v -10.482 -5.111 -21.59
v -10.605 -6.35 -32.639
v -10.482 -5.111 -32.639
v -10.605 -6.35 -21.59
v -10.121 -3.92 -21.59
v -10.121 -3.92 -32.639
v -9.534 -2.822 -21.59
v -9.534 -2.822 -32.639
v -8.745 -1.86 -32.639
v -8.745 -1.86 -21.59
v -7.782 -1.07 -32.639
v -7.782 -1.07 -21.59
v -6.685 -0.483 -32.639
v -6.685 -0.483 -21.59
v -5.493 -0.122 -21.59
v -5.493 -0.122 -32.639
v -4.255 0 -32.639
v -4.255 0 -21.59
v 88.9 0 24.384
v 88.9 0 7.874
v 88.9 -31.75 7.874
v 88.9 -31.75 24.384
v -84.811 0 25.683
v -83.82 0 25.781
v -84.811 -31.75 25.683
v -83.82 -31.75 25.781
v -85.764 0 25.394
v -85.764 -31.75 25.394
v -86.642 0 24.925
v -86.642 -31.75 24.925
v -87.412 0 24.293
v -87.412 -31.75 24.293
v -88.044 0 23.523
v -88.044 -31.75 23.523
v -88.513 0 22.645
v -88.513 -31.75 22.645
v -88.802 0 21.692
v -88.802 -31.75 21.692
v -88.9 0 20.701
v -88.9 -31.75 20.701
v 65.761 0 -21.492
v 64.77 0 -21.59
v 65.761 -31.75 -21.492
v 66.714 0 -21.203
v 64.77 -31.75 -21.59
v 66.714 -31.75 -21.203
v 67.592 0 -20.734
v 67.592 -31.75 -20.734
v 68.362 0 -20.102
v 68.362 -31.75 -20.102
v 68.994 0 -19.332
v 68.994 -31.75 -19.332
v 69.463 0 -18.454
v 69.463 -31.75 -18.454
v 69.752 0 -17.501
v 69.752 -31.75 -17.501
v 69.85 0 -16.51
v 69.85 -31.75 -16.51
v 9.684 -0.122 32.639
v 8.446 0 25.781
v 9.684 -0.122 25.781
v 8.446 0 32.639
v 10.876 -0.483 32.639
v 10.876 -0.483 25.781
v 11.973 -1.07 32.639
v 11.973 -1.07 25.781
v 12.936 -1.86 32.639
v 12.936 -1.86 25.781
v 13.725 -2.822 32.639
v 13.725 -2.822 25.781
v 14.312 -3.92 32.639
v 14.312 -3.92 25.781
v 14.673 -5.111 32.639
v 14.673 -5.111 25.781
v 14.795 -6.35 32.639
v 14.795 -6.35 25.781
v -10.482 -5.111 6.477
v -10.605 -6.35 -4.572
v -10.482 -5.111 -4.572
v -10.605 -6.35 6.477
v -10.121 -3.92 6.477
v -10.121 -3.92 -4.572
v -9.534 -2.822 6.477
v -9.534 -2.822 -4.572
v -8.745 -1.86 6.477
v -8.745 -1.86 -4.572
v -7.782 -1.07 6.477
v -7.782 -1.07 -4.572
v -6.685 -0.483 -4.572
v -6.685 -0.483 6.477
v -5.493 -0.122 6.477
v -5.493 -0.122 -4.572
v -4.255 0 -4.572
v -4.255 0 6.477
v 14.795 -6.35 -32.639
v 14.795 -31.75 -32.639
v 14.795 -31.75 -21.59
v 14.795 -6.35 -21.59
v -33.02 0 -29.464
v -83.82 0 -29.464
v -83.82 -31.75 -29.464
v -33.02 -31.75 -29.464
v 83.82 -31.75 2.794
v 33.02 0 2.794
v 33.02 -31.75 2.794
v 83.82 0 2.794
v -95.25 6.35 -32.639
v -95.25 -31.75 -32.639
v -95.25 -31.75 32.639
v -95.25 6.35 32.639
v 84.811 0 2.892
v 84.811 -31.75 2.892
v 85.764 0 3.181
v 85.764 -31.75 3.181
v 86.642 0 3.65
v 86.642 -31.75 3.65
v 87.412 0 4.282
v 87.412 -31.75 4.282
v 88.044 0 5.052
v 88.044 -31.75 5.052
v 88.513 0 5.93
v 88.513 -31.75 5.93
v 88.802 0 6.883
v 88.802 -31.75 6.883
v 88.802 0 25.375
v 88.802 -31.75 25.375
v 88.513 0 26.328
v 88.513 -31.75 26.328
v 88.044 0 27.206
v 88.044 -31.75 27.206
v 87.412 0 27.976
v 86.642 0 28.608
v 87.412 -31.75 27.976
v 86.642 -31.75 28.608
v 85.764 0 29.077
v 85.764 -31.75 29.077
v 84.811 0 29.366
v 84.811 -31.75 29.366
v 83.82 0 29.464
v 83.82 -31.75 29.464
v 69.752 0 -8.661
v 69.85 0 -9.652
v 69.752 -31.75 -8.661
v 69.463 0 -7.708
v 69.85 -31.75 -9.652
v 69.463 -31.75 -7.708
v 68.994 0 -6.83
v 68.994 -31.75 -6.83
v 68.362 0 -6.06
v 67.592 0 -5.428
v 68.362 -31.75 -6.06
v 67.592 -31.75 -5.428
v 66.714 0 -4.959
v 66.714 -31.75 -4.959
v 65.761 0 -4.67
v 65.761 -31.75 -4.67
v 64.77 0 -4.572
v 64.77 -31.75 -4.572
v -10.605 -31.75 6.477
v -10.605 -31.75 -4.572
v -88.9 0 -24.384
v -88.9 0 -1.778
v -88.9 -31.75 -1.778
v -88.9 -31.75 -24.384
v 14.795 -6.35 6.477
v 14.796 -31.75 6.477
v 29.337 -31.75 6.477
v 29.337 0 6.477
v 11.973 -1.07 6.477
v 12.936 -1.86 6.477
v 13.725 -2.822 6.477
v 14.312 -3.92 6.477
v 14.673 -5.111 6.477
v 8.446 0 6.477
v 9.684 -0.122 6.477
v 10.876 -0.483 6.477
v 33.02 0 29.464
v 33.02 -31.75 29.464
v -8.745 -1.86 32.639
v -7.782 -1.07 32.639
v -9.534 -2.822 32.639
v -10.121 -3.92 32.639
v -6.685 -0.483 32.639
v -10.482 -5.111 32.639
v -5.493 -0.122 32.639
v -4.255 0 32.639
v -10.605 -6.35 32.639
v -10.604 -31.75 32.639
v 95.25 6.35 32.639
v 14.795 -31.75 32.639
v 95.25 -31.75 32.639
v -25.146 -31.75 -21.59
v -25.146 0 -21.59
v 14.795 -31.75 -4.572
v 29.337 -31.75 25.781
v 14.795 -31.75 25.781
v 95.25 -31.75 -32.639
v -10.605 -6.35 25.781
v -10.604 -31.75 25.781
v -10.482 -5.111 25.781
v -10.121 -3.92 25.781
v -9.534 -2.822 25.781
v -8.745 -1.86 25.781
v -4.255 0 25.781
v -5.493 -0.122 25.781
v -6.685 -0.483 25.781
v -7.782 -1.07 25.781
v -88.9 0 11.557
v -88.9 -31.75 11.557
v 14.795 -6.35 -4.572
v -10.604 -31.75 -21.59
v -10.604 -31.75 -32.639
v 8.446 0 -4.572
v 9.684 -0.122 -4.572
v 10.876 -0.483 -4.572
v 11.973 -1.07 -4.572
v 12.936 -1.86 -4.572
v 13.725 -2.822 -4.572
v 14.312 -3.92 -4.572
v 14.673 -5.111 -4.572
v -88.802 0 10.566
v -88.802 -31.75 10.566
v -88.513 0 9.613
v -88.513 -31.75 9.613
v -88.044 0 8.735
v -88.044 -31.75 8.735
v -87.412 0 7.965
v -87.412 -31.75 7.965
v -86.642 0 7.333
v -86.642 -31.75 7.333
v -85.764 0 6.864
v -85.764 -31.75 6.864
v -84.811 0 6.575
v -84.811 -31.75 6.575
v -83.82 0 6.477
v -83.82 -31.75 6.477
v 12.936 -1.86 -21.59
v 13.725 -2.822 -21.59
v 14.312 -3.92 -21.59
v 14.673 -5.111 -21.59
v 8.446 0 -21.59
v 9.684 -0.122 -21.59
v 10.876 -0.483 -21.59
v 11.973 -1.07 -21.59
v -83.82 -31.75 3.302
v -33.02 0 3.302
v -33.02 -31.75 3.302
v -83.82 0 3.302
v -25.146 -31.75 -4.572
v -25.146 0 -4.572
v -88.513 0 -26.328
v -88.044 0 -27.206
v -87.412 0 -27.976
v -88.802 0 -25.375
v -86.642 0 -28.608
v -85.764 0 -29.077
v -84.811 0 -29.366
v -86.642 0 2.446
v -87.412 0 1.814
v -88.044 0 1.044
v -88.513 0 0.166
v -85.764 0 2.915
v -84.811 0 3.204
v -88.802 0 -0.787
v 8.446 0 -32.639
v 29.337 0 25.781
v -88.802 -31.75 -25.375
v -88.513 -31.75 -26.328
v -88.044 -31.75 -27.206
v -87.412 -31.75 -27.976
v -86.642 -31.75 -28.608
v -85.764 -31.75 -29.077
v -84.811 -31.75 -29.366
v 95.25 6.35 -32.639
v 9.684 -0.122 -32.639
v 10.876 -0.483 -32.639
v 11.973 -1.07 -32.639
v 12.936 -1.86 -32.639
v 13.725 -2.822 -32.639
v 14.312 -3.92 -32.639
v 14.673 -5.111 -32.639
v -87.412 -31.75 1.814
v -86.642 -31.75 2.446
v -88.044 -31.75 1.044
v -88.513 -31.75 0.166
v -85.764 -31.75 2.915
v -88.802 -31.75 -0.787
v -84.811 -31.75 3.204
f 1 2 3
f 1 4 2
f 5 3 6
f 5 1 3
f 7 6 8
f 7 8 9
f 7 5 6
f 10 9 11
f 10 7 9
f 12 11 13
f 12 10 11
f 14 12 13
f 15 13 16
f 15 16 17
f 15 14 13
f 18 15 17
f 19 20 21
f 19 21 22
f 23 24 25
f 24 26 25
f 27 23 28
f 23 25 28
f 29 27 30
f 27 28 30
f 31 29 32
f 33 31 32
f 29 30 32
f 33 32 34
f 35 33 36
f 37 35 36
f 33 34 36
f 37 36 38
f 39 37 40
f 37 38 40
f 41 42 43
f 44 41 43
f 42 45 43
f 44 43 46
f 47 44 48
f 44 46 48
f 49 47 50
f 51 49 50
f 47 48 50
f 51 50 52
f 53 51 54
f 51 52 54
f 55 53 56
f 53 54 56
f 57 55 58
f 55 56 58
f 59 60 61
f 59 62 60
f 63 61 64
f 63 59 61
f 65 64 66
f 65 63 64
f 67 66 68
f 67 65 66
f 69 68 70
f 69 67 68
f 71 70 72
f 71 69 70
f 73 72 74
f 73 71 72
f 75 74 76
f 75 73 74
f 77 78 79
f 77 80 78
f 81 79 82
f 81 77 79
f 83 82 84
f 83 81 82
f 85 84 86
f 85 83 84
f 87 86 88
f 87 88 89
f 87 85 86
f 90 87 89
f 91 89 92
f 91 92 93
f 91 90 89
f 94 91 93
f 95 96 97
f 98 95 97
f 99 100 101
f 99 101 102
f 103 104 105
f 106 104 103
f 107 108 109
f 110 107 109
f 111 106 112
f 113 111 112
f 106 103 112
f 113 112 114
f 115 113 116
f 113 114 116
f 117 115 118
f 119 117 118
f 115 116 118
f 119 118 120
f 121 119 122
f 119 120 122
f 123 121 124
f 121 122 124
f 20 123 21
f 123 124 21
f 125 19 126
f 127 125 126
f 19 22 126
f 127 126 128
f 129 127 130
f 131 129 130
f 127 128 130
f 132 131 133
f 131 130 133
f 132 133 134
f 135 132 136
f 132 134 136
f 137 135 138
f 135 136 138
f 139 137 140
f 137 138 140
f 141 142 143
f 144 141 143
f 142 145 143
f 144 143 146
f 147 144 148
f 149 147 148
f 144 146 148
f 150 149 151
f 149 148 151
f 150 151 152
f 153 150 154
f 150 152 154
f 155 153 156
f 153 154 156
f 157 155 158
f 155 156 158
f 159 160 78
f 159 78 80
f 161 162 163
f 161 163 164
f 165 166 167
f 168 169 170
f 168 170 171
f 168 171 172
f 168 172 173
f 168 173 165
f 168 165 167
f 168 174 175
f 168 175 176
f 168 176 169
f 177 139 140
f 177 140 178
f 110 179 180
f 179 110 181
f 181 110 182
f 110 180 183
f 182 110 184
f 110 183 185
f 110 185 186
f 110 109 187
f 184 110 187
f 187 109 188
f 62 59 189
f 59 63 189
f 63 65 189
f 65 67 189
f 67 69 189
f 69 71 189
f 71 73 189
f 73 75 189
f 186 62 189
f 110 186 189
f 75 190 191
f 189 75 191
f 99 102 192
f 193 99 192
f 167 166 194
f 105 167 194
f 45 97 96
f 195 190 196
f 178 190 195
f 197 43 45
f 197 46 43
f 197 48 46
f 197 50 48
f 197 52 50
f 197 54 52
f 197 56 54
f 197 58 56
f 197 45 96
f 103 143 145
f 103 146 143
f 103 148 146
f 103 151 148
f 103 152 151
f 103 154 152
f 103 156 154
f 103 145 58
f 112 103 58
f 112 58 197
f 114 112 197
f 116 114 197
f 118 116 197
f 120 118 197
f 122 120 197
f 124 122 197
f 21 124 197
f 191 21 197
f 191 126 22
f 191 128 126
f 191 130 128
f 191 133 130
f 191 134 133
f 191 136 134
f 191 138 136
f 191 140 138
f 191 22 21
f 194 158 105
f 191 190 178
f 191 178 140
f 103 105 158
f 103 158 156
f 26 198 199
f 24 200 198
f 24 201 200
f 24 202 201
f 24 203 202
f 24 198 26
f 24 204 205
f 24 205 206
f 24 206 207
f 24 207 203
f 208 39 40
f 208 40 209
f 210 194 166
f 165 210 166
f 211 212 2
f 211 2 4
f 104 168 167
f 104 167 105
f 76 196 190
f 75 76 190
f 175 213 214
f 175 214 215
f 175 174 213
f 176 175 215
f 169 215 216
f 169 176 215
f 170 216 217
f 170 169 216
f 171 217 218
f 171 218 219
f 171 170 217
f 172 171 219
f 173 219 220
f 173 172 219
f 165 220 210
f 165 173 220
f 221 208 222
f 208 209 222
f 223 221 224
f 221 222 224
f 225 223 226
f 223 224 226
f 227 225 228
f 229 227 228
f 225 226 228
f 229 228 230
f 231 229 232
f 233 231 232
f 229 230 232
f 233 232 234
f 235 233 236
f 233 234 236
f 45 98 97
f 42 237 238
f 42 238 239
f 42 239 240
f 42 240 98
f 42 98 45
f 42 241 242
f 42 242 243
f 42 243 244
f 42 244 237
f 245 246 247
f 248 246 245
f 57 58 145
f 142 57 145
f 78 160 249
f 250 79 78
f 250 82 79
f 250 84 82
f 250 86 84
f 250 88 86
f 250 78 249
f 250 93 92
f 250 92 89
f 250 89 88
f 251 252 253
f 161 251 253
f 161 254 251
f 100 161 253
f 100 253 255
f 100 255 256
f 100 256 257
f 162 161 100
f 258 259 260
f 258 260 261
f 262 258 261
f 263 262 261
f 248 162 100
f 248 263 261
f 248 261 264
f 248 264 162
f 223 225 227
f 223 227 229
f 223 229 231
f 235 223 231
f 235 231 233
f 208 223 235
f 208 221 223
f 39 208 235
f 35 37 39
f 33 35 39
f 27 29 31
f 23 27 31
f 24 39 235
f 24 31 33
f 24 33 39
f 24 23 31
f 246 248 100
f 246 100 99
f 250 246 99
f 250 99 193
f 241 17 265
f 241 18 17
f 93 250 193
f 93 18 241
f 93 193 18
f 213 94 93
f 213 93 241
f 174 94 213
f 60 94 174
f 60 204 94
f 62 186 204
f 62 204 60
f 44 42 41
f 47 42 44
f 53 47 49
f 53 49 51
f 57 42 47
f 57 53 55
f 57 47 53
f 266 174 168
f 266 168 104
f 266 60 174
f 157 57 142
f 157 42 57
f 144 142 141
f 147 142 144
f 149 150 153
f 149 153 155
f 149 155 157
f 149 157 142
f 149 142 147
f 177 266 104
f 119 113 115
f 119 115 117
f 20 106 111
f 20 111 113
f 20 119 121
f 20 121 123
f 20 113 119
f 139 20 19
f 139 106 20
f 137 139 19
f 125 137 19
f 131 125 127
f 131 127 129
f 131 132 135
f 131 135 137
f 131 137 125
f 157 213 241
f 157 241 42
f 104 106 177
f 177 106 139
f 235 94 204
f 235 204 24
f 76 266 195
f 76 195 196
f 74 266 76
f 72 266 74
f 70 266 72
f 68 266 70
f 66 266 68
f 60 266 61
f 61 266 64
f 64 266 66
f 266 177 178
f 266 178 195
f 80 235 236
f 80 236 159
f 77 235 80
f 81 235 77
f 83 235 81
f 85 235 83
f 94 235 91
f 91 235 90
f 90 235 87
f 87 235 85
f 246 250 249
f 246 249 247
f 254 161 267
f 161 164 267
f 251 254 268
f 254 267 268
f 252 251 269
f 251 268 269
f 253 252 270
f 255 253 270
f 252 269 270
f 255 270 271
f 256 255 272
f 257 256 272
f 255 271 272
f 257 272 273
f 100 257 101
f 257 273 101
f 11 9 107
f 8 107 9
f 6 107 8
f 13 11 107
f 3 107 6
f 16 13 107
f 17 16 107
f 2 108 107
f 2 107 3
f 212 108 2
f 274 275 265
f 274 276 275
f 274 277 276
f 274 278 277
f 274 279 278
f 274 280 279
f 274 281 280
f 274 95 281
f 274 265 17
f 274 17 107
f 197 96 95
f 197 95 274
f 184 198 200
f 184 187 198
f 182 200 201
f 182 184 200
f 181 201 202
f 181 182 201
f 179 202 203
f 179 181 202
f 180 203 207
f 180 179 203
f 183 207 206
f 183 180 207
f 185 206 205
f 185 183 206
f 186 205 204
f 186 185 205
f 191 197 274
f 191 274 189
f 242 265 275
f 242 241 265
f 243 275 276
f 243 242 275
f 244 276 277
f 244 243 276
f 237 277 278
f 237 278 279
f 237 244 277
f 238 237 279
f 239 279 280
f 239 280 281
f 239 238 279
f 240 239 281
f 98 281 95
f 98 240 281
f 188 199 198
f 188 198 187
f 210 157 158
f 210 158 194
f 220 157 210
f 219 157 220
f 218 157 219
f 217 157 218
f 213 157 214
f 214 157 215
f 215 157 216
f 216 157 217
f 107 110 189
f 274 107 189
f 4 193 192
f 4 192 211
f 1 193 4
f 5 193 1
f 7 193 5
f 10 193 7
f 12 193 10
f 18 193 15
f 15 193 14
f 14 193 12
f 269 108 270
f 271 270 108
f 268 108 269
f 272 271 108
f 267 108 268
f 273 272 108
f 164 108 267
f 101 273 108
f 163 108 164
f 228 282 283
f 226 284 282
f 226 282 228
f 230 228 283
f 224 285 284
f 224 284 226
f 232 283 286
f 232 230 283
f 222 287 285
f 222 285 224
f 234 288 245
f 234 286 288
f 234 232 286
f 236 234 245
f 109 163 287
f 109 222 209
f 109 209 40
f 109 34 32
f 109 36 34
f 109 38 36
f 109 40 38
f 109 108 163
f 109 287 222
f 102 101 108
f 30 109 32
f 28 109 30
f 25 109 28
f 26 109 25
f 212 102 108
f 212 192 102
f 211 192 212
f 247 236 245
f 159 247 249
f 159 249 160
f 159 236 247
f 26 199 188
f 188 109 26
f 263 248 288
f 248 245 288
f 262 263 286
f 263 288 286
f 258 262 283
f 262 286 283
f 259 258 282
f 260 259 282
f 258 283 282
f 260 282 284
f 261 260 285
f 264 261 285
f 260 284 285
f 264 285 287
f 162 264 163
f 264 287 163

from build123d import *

# Parameters (mm, degrees)
F0_W          = 190.5
F0_H          = 65.278
F1_DEPTH      = 31.75
F1_DEPTH_BACK = 6.35
F3_DEPTH      = 31.75
F4_R          = 5.08
F5_W          = 25.4
F5_H          = 65.278
F6_DEPTH      = 31.75
F7_R          = 6.35


with BuildPart() as f1:
    # F0 (on Front) → F1 (new body, two sides)
    with BuildSketch(Plane.XZ) as f1_sk:
        Rectangle(F0_W, F0_H)
    extrude(amount=F1_DEPTH)
    extrude(f1_sk.sketch, amount=-F1_DEPTH_BACK)

    # F2 (on Front) → F3 (cut, through all)
    with BuildSketch(Plane.XZ):
        Polygon((29.337, 25.781), (-88.9, 25.781), (-88.9, 6.477), (29.337, 6.477), (33.02, 2.794), (88.9, 2.794), (88.9, 29.464), (33.02, 29.464), align=None)
        Polygon((-33.02, 3.302), (-88.9, 3.302), (-88.9, -29.464), (-33.02, -29.464), (-25.146, -21.59), (69.85, -21.59), (69.85, -4.572), (-25.146, -4.572), align=None)
    extrude(amount=F3_DEPTH, mode=Mode.SUBTRACT)

    # F4
    f4_edges = [f1.edges().sort_by_distance(p)[0] for p in [
        (-88.9, -15.875, 3.302),
        (-88.9, -15.875, -29.464),
        (69.85, -15.875, -4.572),
        (69.85, -15.875, -21.59),
        (88.9, -15.875, 2.794),
        (88.9, -15.875, 29.464),
        (-88.9, -15.875, 25.781),
        (-88.9, -15.875, 6.477),
    ]]
    fillet(f4_edges, radius=F4_R)

    # F5 (on face) → F6 (cut)
    with BuildSketch(Plane.XZ.offset(31.75)):
        with Locations((2.0955, 0)):
            Rectangle(F5_W, F5_H)
    extrude(amount=-F6_DEPTH, mode=Mode.SUBTRACT)

    # F7
    f7_edges = [f1.edges().sort_by_distance(p)[0] for p in [
        (14.7955, 0, -27.1145),
        (14.7955, 0, 0.9525),
        (14.7955, 0, 29.21),
        (-10.6045, 0, 29.21),
        (-10.6045, 0, 0.9525),
        (-10.6045, 0, -27.1145),
    ]]
    fillet(f7_edges, radius=F7_R)


solid = f1.part
